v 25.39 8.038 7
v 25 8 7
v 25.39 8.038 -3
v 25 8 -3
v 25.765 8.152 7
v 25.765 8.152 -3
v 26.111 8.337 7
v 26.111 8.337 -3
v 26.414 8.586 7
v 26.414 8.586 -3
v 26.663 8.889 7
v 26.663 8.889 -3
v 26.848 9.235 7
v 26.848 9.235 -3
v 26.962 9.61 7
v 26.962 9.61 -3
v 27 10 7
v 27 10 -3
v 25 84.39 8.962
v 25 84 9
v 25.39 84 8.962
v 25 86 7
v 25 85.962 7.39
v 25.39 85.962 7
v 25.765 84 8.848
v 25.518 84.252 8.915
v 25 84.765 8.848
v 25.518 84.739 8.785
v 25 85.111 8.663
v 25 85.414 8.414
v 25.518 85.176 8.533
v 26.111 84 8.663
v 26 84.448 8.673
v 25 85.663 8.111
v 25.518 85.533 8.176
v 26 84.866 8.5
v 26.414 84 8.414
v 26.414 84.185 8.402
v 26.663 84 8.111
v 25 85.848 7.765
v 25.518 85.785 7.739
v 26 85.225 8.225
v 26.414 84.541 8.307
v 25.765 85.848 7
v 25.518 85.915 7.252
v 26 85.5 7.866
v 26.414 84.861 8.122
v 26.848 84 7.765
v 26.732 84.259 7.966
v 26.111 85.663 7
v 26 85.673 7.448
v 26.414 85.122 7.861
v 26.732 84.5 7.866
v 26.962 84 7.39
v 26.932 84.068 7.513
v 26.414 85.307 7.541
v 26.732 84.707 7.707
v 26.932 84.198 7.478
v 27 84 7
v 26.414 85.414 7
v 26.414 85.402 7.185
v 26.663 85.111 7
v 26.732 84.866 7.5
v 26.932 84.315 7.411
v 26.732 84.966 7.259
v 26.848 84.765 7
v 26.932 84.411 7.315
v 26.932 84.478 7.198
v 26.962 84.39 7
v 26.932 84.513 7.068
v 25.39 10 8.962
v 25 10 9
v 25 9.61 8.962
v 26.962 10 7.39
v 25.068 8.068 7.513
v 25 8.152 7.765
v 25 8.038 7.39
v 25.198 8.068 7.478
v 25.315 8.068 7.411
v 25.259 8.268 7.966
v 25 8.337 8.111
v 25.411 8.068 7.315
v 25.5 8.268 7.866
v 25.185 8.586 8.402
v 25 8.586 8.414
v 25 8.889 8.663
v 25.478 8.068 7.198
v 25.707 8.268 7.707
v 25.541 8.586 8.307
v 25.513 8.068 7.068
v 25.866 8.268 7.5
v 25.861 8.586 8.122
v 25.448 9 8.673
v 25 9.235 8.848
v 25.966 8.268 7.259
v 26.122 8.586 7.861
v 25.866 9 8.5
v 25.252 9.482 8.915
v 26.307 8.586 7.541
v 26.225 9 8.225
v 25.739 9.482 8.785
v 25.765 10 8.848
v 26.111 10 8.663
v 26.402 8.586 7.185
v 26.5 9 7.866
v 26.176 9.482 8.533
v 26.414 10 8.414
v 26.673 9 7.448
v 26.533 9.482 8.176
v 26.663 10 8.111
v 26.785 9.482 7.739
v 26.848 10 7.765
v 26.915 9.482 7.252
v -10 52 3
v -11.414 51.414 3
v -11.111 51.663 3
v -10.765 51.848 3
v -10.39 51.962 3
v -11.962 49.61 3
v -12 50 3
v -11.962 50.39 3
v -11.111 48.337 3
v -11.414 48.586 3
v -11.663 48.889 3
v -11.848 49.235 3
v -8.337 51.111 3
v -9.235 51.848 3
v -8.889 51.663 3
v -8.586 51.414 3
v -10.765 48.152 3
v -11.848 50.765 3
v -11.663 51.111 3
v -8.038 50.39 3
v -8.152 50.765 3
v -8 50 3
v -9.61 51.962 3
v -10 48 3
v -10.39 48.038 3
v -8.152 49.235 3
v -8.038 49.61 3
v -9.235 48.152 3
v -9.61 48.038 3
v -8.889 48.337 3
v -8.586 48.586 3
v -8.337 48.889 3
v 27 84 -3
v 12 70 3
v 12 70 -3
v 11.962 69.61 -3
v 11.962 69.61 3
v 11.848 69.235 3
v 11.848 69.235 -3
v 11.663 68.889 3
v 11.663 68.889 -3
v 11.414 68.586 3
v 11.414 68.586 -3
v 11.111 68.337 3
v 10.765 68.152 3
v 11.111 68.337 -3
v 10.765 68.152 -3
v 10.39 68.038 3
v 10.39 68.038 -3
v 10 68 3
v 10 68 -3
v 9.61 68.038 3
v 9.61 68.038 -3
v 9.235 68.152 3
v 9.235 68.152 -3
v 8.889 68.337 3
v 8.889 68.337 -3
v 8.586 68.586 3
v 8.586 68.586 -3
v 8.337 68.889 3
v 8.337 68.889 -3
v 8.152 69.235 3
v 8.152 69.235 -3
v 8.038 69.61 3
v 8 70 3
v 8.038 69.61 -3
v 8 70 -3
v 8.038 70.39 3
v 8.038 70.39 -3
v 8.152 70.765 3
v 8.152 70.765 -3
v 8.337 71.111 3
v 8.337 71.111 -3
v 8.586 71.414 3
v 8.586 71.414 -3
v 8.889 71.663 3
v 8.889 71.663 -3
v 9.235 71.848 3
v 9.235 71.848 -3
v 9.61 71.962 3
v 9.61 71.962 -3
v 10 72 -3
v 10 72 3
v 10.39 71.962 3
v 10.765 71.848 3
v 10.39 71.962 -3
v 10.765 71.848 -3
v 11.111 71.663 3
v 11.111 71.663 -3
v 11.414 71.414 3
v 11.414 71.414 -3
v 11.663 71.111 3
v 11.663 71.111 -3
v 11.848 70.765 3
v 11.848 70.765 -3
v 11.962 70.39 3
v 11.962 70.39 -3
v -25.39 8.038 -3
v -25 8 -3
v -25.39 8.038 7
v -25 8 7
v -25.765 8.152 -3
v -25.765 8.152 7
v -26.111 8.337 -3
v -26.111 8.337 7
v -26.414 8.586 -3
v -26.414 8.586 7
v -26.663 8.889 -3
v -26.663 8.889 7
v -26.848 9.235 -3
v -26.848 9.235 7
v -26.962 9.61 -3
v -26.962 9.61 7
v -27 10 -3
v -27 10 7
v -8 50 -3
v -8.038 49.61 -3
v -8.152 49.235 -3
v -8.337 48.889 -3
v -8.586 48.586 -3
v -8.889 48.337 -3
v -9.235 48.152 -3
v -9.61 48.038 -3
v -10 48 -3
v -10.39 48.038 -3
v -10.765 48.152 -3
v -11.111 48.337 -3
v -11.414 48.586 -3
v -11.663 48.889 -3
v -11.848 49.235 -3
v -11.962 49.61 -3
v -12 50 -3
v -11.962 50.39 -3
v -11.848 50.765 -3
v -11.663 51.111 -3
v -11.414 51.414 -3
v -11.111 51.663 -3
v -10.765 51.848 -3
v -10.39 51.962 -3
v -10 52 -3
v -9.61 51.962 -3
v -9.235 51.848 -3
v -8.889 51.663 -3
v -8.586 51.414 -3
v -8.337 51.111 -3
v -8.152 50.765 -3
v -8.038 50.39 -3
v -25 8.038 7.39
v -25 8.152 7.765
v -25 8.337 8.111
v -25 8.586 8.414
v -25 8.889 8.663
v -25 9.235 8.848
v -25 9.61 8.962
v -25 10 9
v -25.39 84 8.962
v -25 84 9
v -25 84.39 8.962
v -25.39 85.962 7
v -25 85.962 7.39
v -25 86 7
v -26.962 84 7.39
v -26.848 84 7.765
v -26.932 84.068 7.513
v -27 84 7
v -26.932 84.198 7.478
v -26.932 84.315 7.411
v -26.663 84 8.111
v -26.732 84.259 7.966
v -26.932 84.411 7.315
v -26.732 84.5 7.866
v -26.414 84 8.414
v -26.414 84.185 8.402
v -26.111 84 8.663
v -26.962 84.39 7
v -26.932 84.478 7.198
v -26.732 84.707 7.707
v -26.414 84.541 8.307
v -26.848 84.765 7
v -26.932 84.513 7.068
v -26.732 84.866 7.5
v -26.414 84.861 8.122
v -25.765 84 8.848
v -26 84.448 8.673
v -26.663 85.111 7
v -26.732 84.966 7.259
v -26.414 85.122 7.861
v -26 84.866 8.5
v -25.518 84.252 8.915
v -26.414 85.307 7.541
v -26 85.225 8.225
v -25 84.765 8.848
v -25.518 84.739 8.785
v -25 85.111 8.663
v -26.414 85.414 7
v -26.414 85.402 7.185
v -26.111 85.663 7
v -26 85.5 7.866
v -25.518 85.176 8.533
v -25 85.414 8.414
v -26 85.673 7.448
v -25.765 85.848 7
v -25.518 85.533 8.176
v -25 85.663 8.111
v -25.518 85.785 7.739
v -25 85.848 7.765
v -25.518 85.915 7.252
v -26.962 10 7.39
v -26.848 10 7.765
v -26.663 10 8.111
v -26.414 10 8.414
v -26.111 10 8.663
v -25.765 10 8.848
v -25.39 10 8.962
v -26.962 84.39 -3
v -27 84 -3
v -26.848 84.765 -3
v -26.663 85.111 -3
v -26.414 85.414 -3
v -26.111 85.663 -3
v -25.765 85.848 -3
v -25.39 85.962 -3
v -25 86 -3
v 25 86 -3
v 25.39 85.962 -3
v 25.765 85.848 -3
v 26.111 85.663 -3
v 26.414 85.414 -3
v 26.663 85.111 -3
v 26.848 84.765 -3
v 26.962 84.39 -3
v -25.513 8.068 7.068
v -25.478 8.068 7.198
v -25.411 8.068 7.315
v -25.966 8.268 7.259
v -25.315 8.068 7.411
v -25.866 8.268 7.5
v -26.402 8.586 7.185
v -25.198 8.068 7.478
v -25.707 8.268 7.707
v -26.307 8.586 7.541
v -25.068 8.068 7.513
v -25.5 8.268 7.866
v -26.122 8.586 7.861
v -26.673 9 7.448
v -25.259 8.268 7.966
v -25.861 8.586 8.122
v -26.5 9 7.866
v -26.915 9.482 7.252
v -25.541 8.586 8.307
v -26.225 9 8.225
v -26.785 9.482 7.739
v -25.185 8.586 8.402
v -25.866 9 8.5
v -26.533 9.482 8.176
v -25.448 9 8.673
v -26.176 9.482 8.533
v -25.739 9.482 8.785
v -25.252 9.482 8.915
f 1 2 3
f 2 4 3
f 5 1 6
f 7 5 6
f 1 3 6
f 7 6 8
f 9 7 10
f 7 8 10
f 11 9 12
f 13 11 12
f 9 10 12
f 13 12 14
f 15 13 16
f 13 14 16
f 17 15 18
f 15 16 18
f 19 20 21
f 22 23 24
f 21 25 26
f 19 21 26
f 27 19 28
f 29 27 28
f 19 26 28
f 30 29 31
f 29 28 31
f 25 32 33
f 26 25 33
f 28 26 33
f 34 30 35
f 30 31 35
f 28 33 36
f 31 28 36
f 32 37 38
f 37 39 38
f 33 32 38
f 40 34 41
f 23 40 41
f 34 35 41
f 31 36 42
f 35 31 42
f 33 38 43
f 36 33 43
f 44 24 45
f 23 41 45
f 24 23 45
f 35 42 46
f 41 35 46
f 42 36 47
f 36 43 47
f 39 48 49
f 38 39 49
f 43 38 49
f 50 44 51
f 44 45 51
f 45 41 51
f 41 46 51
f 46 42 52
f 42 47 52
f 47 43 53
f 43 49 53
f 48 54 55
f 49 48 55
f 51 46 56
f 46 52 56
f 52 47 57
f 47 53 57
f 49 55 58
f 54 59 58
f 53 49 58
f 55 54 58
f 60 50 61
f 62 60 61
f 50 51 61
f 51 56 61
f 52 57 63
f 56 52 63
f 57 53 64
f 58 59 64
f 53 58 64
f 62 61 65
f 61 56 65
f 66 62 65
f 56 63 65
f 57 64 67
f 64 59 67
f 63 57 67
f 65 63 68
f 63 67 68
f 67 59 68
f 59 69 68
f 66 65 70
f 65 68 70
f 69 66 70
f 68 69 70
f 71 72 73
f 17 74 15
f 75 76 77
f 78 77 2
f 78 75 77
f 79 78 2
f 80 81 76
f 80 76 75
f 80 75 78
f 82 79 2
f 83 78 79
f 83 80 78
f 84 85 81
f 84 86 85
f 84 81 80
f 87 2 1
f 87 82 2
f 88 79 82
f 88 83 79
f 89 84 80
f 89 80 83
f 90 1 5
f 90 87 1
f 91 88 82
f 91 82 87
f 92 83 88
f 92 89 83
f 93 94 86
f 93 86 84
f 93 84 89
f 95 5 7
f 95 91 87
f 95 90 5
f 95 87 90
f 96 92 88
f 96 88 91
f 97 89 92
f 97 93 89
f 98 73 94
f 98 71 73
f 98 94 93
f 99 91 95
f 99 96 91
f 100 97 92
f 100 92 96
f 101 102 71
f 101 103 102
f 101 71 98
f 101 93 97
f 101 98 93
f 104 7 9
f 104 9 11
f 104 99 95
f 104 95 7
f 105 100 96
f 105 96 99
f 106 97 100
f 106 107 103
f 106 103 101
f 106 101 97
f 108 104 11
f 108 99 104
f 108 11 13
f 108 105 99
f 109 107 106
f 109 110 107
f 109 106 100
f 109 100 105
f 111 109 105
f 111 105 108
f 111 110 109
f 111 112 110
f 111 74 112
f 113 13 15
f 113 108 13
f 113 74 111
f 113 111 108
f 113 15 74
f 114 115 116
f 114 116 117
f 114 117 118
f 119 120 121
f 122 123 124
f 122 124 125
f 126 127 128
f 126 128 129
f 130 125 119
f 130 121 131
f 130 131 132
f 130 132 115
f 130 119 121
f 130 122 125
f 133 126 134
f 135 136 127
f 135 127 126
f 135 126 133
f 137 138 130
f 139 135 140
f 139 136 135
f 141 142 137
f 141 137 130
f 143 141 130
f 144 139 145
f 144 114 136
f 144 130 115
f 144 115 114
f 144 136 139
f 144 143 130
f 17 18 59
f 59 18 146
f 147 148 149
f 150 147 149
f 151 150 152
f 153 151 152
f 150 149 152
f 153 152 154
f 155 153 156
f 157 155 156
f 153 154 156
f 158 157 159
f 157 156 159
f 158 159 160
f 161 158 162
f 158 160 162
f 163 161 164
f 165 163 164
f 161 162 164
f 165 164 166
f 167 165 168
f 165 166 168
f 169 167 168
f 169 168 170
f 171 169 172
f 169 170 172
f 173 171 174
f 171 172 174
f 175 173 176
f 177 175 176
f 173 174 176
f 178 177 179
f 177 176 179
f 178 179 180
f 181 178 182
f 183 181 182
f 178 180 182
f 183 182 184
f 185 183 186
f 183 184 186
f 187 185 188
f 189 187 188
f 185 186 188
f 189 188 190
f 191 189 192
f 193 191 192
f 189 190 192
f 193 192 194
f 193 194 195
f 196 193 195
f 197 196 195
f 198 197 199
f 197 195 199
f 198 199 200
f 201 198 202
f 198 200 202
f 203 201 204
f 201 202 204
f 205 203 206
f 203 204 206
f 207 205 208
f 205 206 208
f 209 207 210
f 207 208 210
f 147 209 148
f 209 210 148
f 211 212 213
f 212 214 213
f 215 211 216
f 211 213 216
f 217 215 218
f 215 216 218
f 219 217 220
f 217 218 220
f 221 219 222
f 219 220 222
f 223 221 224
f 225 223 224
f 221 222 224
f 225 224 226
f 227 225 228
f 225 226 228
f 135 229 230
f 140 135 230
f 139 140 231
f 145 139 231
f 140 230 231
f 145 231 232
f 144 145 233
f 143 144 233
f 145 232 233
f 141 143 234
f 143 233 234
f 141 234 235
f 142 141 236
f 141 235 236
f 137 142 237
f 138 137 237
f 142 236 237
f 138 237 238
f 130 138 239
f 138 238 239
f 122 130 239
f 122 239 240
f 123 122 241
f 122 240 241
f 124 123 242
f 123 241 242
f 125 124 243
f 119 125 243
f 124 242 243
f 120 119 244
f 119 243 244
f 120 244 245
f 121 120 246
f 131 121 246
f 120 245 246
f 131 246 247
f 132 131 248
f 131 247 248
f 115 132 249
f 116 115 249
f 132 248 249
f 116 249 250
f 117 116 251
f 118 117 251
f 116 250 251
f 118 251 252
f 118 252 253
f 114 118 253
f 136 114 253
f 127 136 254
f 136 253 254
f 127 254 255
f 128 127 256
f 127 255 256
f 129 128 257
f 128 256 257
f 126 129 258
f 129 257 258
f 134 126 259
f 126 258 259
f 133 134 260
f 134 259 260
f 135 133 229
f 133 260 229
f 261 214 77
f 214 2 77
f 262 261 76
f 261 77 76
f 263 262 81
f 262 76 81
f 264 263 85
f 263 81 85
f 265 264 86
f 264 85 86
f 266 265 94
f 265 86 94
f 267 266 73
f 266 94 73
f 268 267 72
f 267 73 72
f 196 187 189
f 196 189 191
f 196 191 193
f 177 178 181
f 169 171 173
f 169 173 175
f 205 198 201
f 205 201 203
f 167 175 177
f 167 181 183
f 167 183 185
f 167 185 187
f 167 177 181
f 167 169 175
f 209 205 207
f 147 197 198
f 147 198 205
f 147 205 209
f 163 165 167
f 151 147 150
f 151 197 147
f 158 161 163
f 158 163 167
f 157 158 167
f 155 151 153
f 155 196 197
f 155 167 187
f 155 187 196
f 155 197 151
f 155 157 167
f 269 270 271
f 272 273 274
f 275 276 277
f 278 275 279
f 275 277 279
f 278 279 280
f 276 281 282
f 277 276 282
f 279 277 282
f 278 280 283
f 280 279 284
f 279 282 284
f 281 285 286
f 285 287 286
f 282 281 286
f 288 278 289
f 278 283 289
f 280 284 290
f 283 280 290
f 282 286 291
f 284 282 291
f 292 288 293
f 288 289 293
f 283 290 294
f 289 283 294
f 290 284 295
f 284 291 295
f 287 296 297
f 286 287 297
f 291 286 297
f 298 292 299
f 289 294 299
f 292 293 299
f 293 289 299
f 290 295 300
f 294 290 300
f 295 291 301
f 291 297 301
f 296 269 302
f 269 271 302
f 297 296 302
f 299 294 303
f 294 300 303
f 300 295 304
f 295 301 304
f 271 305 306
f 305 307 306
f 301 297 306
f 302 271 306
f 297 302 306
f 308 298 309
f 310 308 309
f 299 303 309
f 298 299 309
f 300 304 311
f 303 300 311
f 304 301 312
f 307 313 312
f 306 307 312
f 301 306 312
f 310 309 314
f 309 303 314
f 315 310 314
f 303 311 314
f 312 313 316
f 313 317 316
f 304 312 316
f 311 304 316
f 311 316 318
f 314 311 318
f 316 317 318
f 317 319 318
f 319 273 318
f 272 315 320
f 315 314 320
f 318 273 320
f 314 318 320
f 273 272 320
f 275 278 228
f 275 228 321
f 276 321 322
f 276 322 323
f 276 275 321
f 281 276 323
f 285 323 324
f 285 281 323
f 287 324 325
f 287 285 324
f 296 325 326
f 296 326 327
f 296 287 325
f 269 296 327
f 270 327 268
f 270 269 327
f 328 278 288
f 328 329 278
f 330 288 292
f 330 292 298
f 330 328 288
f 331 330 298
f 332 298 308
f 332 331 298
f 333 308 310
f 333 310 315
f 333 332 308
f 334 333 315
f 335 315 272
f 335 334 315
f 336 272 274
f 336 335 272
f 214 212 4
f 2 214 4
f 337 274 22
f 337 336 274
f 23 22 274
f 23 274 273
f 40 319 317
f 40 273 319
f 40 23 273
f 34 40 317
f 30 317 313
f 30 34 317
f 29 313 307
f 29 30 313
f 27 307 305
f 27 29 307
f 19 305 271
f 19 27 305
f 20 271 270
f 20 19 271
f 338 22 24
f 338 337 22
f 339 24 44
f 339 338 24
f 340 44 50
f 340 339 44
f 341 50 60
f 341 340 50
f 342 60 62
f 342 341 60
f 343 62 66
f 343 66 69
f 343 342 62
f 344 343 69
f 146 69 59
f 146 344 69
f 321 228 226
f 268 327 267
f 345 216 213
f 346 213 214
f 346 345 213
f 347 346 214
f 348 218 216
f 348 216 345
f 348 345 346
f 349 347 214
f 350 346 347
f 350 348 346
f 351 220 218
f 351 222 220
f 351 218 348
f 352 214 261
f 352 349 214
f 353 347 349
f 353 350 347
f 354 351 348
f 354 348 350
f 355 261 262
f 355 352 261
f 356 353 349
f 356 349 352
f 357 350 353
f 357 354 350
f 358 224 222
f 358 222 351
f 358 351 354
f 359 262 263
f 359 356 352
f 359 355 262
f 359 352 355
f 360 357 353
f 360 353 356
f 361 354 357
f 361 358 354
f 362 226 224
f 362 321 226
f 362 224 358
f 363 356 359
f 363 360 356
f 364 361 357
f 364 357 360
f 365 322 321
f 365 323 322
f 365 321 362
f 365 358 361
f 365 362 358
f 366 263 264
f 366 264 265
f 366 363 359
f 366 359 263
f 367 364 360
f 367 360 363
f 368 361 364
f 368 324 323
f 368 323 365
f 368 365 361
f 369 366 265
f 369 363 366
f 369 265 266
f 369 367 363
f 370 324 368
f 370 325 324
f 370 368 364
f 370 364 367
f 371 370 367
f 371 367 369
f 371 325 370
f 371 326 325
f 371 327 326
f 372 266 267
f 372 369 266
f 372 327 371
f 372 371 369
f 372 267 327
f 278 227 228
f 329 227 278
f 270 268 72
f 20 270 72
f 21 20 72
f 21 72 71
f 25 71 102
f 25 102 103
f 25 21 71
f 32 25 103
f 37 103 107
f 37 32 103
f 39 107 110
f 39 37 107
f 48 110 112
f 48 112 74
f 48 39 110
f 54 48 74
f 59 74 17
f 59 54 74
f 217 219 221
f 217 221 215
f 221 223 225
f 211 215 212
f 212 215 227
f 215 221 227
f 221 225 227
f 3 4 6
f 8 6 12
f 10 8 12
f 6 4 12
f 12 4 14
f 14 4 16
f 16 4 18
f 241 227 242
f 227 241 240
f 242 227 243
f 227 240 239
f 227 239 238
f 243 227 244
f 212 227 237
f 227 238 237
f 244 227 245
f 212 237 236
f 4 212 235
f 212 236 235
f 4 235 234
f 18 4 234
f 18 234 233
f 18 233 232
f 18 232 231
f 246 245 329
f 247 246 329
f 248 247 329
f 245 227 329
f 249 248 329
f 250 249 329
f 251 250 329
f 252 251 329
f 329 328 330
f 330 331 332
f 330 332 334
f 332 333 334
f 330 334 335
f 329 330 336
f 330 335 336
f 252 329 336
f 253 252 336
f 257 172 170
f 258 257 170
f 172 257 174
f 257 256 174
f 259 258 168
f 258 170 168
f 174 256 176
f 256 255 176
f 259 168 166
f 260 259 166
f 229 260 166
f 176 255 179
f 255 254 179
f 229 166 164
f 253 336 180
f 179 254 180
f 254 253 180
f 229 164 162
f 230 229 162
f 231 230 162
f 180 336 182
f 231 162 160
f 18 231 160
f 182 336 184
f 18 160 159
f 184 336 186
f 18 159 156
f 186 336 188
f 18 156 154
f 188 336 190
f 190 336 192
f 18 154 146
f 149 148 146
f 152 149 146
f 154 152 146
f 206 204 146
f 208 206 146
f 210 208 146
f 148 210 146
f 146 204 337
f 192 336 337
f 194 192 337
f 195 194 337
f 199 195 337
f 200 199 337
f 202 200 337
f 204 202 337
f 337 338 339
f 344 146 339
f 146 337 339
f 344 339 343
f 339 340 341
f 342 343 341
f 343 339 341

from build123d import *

# Parameters (mm, degrees)
SKETCH001_W  = 54
SKETCH001_H  = 78
PAD001_DEPTH = 12
FILLET_R     = 2
FILLET001_R  = 2
SKETCH002_R  = 2
POCKET_DEPTH = 6
FILLET002_R  = 2


with BuildPart() as part:
    # Sketch001 (on Face1 of CopyCut) → Pad001 (new body)
    with BuildSketch(Plane.XY.offset(-3)):
        with Locations((0, 47)):
            Rectangle(SKETCH001_W, SKETCH001_H)
    extrude(amount=PAD001_DEPTH)

    # Fillet
    fillet_edges = [part.edges().sort_by_distance(p)[0] for p in [
        (0, 86, 9),
    ]]
    fillet(fillet_edges, radius=FILLET_R)

    # Fillet001
    fillet001_edges = [part.edges().sort_by_distance(p)[0] for p in [
        (-27, 46, 9),
        (27, 46, 9),
    ]]
    fillet(fillet001_edges, radius=FILLET001_R)

    # Sketch002 (on Face5 of Fillet001) → Pocket (cut)
    with BuildSketch(Plane(origin=(0, 0, -3), x_dir=(1, 0, 0), z_dir=(0, 0, -1))):
        with Locations((10, -70)):
            Circle(SKETCH002_R)
        with Locations((-10, -50)):
            Circle(SKETCH002_R)
    extrude(amount=-POCKET_DEPTH, mode=Mode.SUBTRACT)

    # Fillet002
    fillet002_edges = [part.edges().sort_by_distance(p)[0] for p in [
        (0, 8, 9),
    ]]
    fillet(fillet002_edges, radius=FILLET002_R)


solid = part.part
